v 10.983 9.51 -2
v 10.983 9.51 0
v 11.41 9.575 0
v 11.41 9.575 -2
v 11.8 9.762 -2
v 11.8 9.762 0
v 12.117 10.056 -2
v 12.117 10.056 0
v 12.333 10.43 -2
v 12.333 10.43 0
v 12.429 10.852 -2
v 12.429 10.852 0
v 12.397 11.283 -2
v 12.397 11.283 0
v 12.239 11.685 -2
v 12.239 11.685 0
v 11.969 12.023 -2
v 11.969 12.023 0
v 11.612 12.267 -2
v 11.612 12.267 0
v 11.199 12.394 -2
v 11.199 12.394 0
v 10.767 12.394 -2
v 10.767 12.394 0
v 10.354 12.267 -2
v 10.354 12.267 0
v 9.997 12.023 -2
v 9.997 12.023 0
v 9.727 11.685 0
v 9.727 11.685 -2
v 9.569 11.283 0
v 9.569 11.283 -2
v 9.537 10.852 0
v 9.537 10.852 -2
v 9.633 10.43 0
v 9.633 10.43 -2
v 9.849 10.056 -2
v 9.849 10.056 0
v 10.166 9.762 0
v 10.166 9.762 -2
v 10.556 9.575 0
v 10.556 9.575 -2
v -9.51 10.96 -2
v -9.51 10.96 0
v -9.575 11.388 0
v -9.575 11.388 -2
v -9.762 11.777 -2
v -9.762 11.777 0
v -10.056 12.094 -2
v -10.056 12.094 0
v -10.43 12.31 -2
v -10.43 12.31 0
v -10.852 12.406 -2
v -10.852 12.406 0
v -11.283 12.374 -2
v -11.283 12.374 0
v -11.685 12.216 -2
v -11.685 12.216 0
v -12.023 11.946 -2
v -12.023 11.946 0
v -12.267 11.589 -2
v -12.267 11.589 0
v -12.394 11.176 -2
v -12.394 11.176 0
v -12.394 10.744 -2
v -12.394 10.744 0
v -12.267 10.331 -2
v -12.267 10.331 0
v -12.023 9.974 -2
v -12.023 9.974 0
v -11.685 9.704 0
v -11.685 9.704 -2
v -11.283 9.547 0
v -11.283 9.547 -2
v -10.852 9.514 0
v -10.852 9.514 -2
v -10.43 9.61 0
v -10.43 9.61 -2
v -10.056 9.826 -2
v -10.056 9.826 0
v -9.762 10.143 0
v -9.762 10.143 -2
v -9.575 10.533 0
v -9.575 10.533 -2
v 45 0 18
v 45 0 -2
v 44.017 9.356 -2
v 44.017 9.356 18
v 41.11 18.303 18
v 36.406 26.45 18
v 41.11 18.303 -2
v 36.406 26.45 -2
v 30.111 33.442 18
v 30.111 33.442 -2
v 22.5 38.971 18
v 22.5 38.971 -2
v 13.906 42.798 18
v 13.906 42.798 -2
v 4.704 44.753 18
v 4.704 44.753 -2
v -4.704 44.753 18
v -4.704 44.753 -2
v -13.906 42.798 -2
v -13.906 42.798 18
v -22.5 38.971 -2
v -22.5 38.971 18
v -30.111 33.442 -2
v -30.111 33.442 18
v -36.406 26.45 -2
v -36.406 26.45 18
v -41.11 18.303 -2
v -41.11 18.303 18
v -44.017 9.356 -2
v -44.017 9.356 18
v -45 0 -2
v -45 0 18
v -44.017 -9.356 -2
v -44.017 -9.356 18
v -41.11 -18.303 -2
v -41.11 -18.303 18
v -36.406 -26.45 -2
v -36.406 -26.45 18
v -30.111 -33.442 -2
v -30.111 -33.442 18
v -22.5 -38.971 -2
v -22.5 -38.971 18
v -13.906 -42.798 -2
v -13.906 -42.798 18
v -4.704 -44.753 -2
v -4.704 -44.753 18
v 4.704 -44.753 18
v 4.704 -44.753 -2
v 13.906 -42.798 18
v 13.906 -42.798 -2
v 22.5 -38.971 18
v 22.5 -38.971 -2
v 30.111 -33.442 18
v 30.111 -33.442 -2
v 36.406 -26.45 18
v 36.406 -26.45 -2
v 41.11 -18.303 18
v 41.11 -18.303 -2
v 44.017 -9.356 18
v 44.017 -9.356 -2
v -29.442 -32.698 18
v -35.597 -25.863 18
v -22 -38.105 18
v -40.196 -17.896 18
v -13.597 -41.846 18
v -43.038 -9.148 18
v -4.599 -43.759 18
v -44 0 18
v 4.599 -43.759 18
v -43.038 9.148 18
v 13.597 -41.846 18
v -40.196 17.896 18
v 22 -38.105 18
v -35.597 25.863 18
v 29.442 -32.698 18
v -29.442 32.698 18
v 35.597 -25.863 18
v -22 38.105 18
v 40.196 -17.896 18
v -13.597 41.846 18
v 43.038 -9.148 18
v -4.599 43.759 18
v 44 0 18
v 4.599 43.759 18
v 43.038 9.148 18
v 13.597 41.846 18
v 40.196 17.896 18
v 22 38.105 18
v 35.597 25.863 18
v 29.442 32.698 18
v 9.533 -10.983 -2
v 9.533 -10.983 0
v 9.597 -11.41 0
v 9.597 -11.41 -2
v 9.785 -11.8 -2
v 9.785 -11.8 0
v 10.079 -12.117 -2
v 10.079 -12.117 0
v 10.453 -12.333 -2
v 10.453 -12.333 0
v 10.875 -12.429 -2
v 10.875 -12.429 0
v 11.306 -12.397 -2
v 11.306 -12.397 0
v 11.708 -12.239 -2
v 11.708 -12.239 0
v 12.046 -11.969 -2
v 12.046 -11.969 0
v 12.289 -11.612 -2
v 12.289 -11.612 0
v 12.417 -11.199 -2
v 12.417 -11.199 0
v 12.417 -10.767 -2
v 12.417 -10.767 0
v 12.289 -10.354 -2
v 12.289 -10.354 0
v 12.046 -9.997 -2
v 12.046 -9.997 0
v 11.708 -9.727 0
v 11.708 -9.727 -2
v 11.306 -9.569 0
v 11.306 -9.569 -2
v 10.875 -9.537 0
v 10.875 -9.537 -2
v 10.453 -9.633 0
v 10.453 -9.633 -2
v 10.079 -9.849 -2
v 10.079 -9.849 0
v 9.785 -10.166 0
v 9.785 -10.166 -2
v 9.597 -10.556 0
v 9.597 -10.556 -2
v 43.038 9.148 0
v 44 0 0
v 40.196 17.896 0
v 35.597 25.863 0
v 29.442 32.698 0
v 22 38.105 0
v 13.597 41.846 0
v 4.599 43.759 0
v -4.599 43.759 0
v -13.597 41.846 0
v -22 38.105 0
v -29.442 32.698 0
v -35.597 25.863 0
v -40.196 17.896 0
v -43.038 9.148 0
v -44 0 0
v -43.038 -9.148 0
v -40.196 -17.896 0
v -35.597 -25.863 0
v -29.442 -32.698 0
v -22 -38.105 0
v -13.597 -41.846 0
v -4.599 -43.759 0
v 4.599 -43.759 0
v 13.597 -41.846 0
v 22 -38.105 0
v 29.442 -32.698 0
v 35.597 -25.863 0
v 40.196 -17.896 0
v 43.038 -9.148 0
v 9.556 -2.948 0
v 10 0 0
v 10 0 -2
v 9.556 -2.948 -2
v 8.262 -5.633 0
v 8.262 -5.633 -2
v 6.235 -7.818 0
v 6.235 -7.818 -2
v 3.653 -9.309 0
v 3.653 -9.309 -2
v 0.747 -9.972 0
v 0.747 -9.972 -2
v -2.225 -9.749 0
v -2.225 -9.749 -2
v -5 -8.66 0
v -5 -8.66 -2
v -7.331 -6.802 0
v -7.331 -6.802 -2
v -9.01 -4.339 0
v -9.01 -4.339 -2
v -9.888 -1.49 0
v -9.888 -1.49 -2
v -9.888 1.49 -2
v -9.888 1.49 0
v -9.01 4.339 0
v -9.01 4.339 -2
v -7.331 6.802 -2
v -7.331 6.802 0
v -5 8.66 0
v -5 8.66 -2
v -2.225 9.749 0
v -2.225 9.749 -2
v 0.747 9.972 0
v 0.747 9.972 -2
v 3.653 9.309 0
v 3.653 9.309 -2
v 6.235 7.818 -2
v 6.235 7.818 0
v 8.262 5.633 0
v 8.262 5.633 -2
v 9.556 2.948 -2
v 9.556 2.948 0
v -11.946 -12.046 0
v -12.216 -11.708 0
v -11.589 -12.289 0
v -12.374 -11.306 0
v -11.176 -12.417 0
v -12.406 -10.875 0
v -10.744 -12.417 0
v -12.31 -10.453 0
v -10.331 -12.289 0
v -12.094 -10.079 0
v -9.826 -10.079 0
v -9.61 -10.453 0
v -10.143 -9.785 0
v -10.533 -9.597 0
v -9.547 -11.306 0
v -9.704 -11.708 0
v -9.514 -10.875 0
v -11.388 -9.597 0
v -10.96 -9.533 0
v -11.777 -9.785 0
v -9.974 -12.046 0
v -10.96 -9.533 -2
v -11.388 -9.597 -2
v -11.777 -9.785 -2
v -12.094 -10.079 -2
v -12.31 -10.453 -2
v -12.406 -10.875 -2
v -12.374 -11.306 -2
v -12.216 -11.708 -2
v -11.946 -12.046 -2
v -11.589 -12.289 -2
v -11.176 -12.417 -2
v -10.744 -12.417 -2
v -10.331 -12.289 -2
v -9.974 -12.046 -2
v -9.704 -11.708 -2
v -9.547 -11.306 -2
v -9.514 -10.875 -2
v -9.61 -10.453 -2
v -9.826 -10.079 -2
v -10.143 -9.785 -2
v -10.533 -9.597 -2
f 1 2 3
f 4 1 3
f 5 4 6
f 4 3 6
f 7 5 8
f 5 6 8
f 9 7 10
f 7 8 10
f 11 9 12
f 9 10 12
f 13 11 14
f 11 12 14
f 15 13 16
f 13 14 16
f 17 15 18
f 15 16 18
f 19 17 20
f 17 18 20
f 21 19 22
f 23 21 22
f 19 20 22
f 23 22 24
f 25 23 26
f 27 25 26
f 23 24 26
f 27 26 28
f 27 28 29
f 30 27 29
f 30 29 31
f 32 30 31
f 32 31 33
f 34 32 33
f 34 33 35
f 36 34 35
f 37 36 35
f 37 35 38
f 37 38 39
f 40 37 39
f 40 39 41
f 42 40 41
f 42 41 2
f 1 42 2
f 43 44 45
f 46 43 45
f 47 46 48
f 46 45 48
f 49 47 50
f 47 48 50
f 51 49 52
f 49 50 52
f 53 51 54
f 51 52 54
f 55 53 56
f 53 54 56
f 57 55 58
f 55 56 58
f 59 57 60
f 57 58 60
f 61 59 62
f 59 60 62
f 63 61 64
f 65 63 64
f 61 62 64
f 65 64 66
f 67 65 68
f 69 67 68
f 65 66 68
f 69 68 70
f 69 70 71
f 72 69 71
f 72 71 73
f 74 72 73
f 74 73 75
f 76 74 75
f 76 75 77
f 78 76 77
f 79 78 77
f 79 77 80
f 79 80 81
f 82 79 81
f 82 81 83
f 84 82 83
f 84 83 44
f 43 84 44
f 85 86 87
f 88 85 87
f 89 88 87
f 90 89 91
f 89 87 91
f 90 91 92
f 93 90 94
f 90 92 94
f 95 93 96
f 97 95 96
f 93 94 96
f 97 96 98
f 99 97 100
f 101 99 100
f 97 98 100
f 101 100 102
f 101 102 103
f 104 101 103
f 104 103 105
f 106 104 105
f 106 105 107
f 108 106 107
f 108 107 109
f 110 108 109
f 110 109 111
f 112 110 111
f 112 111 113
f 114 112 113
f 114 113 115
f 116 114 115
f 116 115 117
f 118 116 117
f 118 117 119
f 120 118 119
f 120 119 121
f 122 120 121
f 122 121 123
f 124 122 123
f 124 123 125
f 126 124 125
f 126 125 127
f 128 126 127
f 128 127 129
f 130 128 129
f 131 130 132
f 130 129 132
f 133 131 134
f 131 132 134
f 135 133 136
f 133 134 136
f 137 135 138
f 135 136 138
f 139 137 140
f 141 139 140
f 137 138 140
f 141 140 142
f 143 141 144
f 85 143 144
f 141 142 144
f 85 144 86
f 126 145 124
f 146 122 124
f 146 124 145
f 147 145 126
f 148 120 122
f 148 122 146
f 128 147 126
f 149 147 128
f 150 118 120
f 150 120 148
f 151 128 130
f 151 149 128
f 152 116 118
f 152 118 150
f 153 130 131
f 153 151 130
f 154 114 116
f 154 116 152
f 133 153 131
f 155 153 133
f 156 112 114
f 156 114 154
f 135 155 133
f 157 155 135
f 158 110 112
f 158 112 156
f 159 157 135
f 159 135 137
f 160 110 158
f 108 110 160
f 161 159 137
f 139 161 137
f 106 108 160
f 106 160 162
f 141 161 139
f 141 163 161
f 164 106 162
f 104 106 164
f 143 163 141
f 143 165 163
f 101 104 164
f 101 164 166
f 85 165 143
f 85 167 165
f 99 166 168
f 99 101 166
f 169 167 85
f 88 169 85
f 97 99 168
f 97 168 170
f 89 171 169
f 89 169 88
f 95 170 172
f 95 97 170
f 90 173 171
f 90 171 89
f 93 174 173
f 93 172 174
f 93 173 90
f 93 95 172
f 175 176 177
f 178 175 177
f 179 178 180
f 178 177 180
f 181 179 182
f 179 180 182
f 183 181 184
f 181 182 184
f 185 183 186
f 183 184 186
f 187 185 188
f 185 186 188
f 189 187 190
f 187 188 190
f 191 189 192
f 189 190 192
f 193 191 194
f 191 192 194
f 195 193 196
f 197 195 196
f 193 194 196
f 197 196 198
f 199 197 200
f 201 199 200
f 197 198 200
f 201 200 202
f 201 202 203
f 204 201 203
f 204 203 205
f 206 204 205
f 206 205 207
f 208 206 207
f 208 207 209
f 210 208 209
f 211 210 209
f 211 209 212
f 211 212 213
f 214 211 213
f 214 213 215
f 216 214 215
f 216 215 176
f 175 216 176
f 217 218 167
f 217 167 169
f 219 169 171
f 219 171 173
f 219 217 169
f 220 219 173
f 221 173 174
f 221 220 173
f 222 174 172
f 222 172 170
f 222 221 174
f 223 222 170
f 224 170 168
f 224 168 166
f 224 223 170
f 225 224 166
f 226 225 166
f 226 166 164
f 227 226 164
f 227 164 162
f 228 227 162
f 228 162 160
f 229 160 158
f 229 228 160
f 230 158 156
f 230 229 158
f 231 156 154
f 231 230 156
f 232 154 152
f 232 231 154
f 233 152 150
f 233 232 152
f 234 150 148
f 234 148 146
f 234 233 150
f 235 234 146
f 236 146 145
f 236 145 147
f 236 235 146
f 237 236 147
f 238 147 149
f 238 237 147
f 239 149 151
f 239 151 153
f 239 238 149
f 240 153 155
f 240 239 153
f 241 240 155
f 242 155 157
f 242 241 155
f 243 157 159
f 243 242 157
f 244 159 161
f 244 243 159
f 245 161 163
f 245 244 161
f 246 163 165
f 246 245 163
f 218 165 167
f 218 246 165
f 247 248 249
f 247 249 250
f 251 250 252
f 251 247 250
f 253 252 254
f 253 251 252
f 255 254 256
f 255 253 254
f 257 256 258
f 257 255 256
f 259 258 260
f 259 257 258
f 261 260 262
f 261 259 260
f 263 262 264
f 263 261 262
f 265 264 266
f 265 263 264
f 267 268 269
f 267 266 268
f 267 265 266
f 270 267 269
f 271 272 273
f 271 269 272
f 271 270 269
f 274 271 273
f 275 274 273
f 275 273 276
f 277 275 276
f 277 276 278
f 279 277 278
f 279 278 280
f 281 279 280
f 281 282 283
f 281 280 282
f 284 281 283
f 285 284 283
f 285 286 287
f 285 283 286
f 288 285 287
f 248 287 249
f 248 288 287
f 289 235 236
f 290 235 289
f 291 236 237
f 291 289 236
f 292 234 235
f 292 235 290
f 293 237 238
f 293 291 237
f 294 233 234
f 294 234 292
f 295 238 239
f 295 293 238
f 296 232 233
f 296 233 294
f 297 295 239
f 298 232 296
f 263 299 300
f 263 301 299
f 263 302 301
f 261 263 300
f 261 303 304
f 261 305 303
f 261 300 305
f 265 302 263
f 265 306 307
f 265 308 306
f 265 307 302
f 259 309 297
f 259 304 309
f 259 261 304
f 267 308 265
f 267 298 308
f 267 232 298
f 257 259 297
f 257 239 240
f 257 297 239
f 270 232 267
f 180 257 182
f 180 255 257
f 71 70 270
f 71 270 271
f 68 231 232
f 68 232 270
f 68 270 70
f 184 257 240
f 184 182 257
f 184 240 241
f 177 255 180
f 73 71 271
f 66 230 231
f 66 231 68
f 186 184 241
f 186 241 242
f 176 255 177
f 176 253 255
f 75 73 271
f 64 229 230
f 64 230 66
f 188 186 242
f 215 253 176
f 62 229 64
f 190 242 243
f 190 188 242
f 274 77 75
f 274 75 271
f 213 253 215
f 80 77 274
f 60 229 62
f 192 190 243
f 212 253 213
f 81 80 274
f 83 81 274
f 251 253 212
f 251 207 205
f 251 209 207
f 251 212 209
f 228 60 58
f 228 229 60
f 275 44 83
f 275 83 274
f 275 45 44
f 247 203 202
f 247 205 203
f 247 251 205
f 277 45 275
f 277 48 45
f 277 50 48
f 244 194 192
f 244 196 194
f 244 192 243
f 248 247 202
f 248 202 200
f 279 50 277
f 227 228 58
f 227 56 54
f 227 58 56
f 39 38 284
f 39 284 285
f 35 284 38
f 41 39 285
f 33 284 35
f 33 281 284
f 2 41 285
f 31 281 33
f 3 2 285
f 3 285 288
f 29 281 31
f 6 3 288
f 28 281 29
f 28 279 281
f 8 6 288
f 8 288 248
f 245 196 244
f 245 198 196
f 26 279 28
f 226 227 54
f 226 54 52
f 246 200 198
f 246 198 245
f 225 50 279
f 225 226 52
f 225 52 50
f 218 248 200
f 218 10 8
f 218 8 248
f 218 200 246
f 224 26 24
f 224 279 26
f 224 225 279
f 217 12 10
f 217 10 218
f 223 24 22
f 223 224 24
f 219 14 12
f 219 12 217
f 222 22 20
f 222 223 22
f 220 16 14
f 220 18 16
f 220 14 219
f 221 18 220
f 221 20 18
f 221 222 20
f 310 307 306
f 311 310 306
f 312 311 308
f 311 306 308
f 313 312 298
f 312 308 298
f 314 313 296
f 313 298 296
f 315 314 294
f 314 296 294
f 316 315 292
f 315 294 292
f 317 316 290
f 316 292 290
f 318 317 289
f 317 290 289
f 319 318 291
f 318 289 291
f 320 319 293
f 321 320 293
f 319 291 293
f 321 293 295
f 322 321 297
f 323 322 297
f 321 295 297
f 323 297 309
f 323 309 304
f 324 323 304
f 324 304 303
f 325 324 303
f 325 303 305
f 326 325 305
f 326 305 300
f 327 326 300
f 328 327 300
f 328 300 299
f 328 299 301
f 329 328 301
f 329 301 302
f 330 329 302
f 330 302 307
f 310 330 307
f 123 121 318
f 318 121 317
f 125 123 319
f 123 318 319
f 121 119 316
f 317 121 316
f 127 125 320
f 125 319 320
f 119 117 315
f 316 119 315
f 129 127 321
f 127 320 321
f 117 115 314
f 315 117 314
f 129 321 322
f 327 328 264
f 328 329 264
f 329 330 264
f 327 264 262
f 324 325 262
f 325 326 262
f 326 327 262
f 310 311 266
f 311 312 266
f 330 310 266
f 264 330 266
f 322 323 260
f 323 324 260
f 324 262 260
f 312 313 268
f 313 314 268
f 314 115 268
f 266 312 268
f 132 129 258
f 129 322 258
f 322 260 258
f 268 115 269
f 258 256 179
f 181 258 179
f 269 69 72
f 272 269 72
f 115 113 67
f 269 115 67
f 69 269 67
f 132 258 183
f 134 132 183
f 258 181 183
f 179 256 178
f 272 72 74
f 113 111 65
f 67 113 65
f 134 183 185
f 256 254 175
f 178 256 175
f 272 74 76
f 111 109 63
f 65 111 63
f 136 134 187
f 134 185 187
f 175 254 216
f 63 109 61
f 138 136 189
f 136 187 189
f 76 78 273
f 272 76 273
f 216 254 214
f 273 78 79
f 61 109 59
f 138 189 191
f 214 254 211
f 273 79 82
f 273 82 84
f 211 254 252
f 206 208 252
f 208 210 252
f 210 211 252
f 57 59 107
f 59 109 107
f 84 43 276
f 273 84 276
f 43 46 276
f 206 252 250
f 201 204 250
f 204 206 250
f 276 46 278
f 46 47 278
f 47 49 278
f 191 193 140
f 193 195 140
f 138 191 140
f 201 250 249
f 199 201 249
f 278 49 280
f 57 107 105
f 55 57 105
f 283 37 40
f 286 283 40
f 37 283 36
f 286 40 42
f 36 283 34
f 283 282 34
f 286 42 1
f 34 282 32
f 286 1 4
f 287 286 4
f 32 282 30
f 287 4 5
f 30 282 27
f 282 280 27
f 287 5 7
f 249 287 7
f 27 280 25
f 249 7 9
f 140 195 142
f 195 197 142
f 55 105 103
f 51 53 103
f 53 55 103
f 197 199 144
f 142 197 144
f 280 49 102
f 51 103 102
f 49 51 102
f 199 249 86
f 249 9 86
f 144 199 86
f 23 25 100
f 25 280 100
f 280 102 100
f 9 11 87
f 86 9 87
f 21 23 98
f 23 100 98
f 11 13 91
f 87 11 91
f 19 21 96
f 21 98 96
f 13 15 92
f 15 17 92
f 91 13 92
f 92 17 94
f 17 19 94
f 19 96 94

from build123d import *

# Parameters (mm, degrees)
SKETCH1_R               = 45
SKETCH1_R_2             = 44
BOSS_EXTRUDE1_DEPTH     = 18
BOSS_EXTRUDE2_START     = -2
SKETCH1_2_R             = 45
SKETCH1_2_R_2           = 44
BOSS_EXTRUDE2_DEPTH     = 2
M3_5X0_6_TAPPED_HOLE1_D = 2.9
CIRPATTERN1_COUNT       = 4
CUT_EXTRUDE1_DEPTH      = 67.708320321
CUT_EXTRUDE1_DEPTH_BACK = 67.708320321
SKETCH2_R               = 10


with BuildPart() as part:
    # Sketch1 → Boss-Extrude1 (new body)
    with BuildSketch(Plane.XY):
        Circle(SKETCH1_R)
        Circle(SKETCH1_R_2, mode=Mode.SUBTRACT)
    extrude(amount=BOSS_EXTRUDE1_DEPTH)

    # Sketch1<2> → Boss-Extrude2 (add)
    # profile 1 of 2: a face of its own
    with BuildSketch(Plane.XY.offset(BOSS_EXTRUDE2_START)):
        Circle(SKETCH1_2_R)
        Circle(SKETCH1_2_R_2, mode=Mode.SUBTRACT)
    # profile 2 of 2: a face of its own
    with BuildSketch(Plane.XY.offset(BOSS_EXTRUDE2_START)):
        Circle(SKETCH1_2_R_2)
    extrude(amount=BOSS_EXTRUDE2_DEPTH)

    # M3.5x0.6 Tapped Hole1 (through all)
    with Locations(Plane(origin=(0, 0, -2), x_dir=(-1, 0, 0), z_dir=(0, 0, -1))):
        with Locations((10.960155108, 10.960155108)):
            m3_5x0_6_tapped_hole1 = Hole(M3_5X0_6_TAPPED_HOLE1_D / 2)

    # CirPattern1: M3.5x0.6 Tapped Hole1 ×4 about axis
    cirpattern1_axis = Axis((0.011391445, -0.011391445, 0), (0, 0, 1))
    for i in range(1, CIRPATTERN1_COUNT):
        add(m3_5x0_6_tapped_hole1.rotate(cirpattern1_axis, i * 360 / CIRPATTERN1_COUNT), mode=Mode.SUBTRACT)

    # Sketch2 → Cut-Extrude1 (cut, two sides: drawn at the far end of the back side and taken through both)
    with BuildSketch(Plane(origin=(0, 0, -2), x_dir=(-1, 0, 0), z_dir=(0, 0, -1)).offset(-CUT_EXTRUDE1_DEPTH_BACK)):
        with Locations(Location((0, 0, 0), (0, 0, 180))):
            Circle(SKETCH2_R)
    extrude(amount=CUT_EXTRUDE1_DEPTH + CUT_EXTRUDE1_DEPTH_BACK, mode=Mode.SUBTRACT)


solid = part.part
